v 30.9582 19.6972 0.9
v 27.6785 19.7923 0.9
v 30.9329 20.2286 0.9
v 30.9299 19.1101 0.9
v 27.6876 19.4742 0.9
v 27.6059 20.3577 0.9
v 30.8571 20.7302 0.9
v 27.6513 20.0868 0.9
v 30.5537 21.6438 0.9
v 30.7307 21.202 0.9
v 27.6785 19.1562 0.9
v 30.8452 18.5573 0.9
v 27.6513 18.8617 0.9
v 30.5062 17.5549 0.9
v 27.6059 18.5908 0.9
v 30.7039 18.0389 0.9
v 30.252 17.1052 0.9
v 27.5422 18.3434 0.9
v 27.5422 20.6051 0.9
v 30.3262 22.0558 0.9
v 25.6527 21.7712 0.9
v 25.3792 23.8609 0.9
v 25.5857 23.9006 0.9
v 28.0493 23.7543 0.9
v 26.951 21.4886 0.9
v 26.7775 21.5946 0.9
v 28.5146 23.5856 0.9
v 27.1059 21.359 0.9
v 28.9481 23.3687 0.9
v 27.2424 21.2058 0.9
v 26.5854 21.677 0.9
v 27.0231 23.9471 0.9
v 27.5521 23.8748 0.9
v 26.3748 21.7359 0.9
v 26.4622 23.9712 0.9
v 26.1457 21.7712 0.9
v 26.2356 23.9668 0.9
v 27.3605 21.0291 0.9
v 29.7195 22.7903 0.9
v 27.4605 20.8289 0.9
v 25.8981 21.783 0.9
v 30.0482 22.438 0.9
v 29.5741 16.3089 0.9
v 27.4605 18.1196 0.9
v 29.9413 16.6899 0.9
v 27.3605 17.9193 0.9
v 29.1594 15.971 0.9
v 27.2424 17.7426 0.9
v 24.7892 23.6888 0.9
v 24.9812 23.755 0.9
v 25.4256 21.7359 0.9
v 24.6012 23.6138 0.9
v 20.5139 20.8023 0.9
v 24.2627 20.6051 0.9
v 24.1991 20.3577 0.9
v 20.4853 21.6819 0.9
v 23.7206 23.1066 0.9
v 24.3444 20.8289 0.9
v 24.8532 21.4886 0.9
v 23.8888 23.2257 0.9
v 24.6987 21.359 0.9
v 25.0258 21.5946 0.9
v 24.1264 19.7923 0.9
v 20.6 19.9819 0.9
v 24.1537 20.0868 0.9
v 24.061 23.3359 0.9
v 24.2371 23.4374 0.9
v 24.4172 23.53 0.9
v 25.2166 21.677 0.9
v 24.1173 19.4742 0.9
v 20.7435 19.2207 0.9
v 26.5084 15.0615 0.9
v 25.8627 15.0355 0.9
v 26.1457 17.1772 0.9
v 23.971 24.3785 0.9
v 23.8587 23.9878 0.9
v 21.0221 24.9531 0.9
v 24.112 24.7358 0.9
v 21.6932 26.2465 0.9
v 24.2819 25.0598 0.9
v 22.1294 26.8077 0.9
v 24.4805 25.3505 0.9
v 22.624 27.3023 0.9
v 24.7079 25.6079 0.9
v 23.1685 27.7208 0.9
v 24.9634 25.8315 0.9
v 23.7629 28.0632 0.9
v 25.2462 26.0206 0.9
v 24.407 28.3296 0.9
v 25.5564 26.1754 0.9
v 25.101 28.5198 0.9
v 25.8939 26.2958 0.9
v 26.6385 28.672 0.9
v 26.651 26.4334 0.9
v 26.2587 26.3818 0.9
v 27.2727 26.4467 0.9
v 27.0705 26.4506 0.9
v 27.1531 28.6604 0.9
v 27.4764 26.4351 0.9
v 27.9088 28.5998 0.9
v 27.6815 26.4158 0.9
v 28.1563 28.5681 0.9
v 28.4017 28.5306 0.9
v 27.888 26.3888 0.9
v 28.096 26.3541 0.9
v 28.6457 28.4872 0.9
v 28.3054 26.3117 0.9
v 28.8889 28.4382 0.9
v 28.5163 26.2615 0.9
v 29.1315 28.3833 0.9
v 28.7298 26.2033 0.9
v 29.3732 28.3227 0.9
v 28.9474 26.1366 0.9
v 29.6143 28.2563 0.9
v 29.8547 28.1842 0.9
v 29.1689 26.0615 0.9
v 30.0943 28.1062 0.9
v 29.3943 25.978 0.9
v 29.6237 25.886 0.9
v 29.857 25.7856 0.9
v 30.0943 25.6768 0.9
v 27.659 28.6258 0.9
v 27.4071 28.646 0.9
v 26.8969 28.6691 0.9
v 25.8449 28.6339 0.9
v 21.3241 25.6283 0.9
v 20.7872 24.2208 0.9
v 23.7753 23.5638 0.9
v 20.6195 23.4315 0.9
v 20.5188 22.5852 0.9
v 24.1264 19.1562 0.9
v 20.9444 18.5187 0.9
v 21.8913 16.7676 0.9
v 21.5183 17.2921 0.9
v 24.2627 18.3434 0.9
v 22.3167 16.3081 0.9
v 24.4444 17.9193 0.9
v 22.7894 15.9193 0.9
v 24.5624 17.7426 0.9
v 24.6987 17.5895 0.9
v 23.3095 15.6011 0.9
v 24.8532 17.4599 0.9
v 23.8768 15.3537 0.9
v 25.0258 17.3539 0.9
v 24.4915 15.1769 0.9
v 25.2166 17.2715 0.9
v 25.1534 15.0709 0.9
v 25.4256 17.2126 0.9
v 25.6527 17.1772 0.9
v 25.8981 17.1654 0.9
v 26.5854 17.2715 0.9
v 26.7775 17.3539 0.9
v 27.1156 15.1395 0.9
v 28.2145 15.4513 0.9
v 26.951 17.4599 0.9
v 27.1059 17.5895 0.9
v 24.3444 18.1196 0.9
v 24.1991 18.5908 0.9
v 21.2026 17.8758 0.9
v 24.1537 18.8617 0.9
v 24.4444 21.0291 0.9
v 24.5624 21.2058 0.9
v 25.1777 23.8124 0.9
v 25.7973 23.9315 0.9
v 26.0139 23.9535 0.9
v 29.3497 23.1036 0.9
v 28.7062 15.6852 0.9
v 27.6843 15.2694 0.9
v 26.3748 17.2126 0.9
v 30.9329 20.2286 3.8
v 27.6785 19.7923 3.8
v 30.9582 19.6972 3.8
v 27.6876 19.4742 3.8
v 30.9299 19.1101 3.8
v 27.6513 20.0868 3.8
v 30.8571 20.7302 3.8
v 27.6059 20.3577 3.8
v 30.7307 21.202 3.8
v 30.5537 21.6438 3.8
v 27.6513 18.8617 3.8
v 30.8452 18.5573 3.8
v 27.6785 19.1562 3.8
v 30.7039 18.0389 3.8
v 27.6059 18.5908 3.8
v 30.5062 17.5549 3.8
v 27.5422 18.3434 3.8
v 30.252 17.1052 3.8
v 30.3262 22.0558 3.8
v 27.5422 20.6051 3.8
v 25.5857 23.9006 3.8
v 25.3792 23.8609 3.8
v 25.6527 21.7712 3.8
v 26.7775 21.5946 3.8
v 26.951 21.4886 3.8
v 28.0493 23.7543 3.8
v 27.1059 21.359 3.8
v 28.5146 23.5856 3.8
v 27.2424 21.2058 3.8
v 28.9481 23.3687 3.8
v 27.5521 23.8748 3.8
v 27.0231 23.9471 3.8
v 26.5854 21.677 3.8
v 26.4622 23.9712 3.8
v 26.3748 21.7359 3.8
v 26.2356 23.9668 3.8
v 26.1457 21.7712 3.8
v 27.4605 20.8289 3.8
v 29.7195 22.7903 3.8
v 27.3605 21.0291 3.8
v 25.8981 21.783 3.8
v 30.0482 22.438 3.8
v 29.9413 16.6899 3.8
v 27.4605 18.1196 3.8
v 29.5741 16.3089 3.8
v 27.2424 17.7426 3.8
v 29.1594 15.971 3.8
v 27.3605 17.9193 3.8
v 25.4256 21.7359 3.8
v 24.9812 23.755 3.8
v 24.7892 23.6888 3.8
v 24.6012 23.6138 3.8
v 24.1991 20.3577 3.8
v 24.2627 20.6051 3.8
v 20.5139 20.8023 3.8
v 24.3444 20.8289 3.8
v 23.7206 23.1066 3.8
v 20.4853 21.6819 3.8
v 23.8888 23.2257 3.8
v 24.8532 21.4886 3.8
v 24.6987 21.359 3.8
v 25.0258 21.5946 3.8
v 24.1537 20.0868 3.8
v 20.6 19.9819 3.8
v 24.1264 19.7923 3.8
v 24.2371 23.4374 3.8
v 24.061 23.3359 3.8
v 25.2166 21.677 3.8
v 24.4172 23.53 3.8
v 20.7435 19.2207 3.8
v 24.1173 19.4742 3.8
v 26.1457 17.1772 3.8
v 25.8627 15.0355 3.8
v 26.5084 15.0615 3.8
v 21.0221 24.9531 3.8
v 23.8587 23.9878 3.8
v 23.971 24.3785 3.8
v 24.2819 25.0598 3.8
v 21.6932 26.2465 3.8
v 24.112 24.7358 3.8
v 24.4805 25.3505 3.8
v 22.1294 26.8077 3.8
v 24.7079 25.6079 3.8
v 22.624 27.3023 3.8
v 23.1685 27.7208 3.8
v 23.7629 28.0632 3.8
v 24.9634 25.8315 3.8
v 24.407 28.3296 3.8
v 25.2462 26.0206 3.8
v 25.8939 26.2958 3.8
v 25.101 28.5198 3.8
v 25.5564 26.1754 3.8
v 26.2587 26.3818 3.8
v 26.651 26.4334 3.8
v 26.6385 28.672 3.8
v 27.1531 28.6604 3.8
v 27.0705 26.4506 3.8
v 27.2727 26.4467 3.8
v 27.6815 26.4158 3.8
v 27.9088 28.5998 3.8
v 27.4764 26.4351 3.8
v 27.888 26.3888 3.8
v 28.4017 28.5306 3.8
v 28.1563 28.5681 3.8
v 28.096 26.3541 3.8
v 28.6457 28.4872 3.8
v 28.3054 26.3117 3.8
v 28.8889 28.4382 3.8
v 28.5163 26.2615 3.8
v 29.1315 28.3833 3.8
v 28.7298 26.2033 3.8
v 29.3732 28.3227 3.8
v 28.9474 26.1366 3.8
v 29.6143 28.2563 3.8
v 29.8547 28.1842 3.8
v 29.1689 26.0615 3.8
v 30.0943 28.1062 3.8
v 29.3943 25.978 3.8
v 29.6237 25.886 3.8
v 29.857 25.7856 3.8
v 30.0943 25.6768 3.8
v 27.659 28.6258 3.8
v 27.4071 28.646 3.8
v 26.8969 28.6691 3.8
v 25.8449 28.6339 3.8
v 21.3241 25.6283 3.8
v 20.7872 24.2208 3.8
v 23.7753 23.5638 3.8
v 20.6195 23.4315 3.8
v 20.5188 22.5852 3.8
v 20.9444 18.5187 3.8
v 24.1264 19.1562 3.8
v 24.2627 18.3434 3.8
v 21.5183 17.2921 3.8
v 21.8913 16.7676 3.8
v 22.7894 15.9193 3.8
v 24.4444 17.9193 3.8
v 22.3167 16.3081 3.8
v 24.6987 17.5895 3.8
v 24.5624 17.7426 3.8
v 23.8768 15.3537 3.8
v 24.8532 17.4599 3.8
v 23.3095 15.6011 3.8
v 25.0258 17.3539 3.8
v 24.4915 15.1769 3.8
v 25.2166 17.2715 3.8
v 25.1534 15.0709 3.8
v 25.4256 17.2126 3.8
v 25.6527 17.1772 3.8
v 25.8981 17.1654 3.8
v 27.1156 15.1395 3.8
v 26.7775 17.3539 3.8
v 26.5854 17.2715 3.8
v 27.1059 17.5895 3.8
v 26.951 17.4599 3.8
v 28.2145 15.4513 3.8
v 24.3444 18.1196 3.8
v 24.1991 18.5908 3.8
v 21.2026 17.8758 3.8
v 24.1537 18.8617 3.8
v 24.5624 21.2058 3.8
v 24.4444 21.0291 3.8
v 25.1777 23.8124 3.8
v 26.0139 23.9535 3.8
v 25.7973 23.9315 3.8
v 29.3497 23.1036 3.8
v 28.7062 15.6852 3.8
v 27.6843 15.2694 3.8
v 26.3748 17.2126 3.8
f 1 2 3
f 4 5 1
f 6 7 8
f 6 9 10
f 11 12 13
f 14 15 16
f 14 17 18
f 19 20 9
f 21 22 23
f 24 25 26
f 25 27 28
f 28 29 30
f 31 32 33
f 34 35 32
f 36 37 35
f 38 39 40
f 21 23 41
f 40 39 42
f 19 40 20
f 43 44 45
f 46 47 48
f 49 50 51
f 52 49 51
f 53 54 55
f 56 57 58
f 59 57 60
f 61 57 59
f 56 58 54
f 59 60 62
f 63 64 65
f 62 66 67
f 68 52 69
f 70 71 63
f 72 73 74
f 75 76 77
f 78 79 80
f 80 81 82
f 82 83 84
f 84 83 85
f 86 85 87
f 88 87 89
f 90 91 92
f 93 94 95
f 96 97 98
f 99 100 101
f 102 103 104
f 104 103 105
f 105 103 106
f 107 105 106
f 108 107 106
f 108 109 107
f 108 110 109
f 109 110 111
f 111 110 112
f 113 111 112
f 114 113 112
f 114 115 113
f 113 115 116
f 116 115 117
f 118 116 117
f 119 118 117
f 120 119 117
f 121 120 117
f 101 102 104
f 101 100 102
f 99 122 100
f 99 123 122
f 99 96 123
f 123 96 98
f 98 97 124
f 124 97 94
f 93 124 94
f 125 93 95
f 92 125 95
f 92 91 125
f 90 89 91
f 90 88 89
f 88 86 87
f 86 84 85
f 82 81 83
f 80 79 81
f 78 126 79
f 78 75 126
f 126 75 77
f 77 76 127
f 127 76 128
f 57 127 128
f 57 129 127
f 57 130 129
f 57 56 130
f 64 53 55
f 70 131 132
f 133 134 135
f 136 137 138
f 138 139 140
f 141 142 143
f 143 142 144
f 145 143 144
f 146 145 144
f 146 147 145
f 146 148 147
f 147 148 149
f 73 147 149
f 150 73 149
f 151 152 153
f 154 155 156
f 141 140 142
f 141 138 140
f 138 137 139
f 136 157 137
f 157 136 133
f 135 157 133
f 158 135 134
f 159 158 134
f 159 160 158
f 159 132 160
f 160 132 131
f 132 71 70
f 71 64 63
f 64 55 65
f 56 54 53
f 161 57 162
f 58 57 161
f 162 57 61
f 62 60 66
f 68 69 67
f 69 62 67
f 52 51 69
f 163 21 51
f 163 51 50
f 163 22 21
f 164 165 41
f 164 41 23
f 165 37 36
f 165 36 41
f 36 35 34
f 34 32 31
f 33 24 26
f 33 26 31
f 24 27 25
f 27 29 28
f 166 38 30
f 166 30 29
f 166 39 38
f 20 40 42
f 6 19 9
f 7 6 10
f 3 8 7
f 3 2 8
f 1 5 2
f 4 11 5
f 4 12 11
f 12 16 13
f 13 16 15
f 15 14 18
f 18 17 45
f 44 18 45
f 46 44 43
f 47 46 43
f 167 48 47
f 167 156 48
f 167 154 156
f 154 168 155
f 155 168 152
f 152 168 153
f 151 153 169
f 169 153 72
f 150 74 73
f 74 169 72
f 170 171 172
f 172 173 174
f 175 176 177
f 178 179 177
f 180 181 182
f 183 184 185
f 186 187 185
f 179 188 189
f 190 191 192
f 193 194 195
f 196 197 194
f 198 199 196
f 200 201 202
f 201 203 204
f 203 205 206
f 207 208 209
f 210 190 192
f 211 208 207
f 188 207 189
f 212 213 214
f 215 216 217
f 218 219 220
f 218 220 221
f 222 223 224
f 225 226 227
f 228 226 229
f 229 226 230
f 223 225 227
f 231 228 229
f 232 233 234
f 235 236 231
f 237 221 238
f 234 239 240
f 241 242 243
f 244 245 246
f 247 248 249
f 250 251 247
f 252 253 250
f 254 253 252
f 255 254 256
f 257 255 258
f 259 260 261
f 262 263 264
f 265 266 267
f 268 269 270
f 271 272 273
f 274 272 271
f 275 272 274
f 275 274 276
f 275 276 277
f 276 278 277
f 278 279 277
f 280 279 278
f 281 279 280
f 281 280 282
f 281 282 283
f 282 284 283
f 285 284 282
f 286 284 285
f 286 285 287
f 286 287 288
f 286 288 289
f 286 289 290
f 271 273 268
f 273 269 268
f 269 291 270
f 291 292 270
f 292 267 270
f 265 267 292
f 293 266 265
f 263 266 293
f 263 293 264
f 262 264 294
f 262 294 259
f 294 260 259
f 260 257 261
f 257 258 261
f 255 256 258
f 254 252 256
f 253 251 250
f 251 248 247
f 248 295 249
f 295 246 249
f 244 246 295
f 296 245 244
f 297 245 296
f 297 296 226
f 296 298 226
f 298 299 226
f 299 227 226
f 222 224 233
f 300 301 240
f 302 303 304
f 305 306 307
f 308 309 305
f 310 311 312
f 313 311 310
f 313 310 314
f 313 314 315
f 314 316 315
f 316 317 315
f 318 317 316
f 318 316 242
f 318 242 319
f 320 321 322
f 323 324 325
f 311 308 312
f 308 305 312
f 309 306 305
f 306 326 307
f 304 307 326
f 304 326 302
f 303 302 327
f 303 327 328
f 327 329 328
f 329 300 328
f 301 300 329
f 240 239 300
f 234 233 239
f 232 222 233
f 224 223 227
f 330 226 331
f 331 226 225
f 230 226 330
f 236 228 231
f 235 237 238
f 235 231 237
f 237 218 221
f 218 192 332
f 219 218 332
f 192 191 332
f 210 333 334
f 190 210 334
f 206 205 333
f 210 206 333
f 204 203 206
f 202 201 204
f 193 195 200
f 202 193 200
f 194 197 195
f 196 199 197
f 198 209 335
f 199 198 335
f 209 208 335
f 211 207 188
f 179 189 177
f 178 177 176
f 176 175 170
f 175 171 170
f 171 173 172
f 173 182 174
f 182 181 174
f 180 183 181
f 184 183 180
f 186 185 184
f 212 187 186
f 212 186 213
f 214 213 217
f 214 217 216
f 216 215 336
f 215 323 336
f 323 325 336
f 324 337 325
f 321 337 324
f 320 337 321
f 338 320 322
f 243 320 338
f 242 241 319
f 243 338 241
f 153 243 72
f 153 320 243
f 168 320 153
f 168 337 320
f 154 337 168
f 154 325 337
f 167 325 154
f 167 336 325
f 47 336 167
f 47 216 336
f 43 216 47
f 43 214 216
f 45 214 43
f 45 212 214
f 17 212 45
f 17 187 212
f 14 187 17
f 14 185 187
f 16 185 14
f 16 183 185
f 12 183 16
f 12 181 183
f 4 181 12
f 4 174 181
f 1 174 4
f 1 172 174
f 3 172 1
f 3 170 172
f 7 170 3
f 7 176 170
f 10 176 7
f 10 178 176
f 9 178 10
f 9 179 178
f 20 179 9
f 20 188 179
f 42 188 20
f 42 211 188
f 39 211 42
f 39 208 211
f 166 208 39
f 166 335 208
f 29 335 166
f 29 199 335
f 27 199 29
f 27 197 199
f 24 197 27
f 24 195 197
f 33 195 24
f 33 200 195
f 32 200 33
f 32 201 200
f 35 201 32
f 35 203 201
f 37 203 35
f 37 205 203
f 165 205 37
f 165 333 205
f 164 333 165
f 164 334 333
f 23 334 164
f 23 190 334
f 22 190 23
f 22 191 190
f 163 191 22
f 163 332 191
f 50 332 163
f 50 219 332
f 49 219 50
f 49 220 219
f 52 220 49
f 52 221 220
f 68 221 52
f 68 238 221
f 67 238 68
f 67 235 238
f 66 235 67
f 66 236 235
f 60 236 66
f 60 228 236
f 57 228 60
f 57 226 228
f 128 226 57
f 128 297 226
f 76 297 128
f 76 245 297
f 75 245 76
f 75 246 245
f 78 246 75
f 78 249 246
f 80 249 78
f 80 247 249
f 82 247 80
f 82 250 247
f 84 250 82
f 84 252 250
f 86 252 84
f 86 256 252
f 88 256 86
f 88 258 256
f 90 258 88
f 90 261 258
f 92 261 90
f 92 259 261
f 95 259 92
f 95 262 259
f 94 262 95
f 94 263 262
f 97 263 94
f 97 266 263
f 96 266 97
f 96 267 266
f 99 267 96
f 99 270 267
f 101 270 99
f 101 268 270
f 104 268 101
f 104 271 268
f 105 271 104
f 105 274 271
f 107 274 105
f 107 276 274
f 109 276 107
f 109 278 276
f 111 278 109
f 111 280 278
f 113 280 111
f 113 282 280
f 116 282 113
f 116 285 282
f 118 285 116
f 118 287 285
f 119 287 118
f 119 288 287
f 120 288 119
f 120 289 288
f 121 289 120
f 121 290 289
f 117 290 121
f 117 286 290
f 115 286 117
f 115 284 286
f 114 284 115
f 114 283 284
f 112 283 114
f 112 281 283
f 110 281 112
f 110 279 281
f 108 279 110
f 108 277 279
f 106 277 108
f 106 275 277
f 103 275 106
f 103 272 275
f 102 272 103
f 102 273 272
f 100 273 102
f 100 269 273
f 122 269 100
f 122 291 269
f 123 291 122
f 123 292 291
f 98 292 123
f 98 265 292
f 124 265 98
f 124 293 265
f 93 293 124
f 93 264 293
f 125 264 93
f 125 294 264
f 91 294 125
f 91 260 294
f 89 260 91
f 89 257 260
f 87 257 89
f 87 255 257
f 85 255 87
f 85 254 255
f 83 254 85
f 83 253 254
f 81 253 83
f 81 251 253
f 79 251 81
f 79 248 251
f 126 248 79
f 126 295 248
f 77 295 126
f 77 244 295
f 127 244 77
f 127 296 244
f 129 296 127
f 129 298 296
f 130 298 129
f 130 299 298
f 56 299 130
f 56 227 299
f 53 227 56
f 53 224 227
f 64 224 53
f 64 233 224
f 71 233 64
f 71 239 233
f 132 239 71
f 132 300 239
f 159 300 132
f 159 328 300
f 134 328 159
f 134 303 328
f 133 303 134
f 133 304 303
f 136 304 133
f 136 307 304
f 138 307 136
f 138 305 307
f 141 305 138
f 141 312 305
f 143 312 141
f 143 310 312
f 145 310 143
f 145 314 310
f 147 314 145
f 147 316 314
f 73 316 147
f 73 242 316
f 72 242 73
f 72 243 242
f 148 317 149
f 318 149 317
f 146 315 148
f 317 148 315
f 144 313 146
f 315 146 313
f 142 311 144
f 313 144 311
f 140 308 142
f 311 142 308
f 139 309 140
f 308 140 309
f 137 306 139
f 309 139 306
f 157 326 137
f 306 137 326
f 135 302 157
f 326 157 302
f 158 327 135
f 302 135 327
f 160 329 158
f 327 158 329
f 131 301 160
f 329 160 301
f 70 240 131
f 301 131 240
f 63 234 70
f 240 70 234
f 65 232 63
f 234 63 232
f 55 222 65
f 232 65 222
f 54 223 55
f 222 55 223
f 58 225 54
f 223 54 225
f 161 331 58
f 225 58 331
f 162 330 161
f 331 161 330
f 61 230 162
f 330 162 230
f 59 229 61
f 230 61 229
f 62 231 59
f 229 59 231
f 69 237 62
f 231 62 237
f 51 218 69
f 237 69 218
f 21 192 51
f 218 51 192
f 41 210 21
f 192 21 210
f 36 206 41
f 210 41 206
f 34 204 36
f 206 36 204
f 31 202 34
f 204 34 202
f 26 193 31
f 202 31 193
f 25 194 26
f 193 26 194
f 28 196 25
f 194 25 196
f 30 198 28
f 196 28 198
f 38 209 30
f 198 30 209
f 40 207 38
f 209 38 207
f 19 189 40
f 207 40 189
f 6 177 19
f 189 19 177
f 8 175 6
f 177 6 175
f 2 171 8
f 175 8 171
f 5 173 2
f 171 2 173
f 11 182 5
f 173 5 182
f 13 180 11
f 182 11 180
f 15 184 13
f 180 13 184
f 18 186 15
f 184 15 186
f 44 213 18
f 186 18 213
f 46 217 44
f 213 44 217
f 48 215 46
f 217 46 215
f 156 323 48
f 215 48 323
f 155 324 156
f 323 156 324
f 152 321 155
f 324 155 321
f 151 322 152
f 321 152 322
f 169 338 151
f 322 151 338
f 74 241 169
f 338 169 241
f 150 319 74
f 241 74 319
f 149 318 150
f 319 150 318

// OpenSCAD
$fn = 48;
  translate([25.500, 21.700, 0.900])
    linear_extrude(height=2.900)
      text("6", size=13.000, halign="center", valign="center", font="Helvetica Neue:style=Bold");
